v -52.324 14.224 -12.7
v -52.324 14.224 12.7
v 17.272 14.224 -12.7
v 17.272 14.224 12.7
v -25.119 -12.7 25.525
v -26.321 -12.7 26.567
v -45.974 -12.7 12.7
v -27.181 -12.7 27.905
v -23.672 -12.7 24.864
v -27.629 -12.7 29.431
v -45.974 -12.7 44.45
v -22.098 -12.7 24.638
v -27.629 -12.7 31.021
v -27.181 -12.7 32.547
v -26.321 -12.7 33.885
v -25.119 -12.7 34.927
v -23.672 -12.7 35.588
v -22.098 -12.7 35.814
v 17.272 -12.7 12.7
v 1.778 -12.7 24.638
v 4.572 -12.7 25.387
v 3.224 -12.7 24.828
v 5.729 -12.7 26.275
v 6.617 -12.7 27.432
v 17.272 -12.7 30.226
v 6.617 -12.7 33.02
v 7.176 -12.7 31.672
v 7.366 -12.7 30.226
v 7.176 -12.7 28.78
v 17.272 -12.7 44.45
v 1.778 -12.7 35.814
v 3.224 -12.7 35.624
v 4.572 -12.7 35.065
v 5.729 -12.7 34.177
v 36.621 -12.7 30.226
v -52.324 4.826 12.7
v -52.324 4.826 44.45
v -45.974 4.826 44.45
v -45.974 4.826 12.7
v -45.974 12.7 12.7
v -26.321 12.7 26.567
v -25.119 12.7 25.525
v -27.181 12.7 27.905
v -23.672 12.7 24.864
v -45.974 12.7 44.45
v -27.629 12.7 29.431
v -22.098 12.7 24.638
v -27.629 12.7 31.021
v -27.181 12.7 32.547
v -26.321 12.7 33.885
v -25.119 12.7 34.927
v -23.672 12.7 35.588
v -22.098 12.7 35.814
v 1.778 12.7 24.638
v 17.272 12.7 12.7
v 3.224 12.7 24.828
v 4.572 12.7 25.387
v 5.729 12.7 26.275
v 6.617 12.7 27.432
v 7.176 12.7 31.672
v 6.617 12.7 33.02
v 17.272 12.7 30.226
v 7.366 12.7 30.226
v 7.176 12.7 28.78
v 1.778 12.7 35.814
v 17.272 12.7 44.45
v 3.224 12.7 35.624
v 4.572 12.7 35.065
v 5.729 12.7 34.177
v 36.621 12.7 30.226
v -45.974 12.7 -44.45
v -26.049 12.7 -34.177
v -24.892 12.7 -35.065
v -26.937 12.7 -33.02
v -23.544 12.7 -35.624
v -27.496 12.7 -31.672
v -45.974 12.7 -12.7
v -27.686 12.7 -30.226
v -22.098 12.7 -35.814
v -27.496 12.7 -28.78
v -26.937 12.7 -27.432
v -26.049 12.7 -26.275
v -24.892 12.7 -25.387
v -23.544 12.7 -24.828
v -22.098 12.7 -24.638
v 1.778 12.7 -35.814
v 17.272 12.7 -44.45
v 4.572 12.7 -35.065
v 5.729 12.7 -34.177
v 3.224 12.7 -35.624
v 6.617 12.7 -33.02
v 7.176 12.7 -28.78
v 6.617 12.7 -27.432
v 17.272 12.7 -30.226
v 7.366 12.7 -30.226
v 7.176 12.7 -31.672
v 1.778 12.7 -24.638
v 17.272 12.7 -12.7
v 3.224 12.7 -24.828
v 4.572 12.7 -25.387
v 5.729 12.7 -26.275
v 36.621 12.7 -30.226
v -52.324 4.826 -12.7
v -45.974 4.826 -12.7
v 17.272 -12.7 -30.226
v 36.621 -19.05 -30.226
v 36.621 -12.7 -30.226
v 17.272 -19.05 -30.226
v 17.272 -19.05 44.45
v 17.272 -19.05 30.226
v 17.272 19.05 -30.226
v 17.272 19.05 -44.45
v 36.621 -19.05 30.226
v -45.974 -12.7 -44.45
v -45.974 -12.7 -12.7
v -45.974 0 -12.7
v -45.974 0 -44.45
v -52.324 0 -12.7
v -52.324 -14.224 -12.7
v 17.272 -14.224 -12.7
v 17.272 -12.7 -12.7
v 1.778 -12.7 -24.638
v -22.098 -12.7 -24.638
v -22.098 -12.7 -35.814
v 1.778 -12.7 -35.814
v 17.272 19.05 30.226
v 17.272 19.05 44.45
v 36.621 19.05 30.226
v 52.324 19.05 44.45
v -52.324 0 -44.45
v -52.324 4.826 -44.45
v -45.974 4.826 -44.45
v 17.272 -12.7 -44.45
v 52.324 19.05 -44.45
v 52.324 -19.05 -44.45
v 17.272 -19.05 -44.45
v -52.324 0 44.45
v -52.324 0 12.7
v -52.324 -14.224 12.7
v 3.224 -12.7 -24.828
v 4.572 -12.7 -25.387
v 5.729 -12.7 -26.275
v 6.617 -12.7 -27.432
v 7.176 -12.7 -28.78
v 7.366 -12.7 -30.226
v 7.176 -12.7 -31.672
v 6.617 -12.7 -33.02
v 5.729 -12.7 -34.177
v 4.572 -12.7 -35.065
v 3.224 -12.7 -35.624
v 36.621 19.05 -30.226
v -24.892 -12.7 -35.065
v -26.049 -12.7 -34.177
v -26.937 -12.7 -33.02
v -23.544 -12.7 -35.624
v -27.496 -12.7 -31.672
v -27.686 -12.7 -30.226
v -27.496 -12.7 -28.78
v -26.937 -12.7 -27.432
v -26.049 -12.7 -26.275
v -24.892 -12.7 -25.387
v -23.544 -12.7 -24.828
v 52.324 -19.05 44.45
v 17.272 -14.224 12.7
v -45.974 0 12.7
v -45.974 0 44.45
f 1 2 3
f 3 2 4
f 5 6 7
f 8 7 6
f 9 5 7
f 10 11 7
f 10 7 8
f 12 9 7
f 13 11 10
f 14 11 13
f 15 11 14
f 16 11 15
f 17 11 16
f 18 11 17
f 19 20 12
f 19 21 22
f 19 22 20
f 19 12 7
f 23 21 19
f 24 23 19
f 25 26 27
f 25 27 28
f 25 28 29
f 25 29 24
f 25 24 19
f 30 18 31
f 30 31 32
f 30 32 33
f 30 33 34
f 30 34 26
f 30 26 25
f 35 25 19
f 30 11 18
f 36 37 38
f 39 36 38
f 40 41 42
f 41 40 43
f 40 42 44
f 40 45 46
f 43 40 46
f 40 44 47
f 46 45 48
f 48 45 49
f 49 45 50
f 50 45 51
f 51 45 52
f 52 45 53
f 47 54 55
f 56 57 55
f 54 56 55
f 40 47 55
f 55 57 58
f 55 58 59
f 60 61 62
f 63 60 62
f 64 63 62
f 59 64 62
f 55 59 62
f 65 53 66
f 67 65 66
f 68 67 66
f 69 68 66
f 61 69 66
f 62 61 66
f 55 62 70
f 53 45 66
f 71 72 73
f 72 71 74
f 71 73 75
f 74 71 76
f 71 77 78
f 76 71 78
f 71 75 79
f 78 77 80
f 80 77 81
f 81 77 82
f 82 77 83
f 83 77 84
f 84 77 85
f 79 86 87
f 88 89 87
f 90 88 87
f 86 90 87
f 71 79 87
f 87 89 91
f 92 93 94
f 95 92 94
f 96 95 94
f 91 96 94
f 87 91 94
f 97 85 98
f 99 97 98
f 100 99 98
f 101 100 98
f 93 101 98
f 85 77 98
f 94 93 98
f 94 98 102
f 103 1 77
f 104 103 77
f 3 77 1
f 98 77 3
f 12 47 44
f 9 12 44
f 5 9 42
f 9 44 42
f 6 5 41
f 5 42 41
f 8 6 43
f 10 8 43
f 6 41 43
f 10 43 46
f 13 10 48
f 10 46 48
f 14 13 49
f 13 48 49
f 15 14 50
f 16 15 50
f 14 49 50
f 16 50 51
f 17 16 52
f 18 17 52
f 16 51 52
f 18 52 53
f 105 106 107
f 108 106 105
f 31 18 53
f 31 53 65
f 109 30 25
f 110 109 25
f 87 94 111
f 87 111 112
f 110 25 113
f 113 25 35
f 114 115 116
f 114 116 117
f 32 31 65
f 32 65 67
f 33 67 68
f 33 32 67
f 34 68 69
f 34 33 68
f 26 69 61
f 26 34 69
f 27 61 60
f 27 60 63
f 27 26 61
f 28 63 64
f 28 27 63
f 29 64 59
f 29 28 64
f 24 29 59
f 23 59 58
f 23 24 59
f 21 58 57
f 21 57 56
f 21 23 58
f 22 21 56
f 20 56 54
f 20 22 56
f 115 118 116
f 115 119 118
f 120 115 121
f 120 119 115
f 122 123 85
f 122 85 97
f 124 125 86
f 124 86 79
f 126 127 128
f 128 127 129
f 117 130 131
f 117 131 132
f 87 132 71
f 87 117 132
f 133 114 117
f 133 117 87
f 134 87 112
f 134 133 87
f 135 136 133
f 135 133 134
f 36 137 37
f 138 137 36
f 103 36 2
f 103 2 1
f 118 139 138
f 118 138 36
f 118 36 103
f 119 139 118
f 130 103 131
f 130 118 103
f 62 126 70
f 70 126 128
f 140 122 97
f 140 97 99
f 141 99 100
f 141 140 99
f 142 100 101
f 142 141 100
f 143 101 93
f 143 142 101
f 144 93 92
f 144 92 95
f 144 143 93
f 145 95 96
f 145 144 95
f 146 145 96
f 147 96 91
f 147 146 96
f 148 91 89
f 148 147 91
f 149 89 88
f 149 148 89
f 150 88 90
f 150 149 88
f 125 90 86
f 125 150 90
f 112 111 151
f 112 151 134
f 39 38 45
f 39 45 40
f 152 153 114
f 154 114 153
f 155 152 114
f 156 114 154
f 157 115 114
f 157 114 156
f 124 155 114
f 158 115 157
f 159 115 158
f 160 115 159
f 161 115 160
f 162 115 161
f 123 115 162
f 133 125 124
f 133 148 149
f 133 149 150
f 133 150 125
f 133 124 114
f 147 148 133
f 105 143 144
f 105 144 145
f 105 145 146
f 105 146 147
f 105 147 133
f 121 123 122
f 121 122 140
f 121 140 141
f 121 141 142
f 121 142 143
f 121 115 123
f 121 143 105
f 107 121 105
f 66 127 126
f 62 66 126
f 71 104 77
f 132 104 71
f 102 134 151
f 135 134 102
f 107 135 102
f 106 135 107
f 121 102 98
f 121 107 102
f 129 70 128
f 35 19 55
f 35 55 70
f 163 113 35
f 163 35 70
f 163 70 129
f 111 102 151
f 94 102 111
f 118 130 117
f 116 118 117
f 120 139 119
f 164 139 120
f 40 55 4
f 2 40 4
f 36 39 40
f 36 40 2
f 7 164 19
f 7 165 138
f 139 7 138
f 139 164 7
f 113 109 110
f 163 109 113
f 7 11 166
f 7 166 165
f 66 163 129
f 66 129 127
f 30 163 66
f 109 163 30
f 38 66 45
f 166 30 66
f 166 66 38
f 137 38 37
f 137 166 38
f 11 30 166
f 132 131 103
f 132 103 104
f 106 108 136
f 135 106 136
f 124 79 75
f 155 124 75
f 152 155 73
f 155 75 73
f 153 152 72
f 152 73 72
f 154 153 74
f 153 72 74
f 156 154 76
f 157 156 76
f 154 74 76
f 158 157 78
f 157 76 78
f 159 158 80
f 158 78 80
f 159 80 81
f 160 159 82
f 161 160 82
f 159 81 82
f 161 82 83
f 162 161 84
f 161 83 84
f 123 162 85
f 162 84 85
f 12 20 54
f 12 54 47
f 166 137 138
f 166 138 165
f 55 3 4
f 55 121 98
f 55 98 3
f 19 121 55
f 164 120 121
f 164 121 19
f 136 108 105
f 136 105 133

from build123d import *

# Parameters (mm, degrees)
F1_DEPTH = 14.224
F0_W     = 6.35
F0_H     = 17.526
F0_H_2   = 14.224
F2_DEPTH = 4.826
F3_DEPTH = 12.7
F4_DEPTH = 12.7
F5_DEPTH = 19.05


with BuildPart() as f1:
    # F0 (on Front) → F1 (new body, symmetric)
    with BuildSketch(Plane.XZ):
        Polygon((17.272, 12.7), (-45.974, 12.7), (-52.324, 12.7), (-52.324, -12.7), (-45.974, -12.7), (17.272, -12.7), align=None)
    extrude(amount=F1_DEPTH, both=True)

    # F0 (on Front) → F2 (join)
    with BuildSketch(Plane.XZ):
        Polygon((-45.974, 44.45), (-52.324, 44.45), (-52.324, 30.226), (-52.324, 12.7), (-45.974, 12.7), align=None)
        with Locations((-49.149, -21.463)):
            Rectangle(F0_W, F0_H)
        with Locations((-49.149, -37.338)):
            Rectangle(F0_W, F0_H_2)
    extrude(amount=-F2_DEPTH)

    # F0 (on Front) → F3 (join, symmetric)
    with BuildSketch(Plane.XZ):
        Polygon((17.272, 44.45), (-45.974, 44.45), (-45.974, 12.7), (17.272, 12.7), (36.620704, 30.226), (17.272, 30.226), align=None)
        with BuildLine():
            ThreePointArc((-22.098, 24.638), (-27.686, 30.226), (-22.098, 35.814))
            Line((-22.098, 35.814), (1.778, 35.814))
            ThreePointArc((1.778, 35.814), (5.7293126933, 34.1773126933), (7.366, 30.226))
            ThreePointArc((7.366, 30.226), (5.7293126933, 26.2746873067), (1.778, 24.638))
            Line((1.778, 24.638), (-22.098, 24.638))
        make_face(mode=Mode.SUBTRACT)
    extrude(amount=F3_DEPTH, both=True)

    # F0 (on Front) → F4 (join, symmetric)
    with BuildSketch(Plane.XZ):
        Polygon((36.620704, -30.226), (17.272, -12.7), (-45.974, -12.7), (-45.974, -30.226), (-45.974, -44.45), (17.272, -44.45), (17.272, -30.226), align=None)
        with BuildLine():
            ThreePointArc((-22.098, -35.814), (-26.0493126933, -34.1773126933), (-27.686, -30.226))
            ThreePointArc((-27.686, -30.226), (-26.0493126933, -26.2746873067), (-22.098, -24.638))
            Line((-22.098, -24.638), (1.778, -24.638))
            ThreePointArc((1.778, -24.638), (5.7293126933, -26.2746873067), (7.366, -30.226))
            ThreePointArc((7.366, -30.226), (5.7293126933, -34.1773126933), (1.778, -35.814))
            Line((1.778, -35.814), (-22.098, -35.814))
        make_face(mode=Mode.SUBTRACT)
    extrude(amount=F4_DEPTH, both=True)

    # F0 (on Front) → F5 (join, symmetric)
    with BuildSketch(Plane.XZ):
        Polygon((52.324, 44.45), (17.272, 44.45), (17.272, 30.226), (36.620704, 30.226), align=None)
        Polygon((17.272, -44.45), (52.324, -44.45), (36.620704, -30.226), (17.272, -30.226), align=None)
    extrude(amount=F5_DEPTH, both=True)


solid = f1.part
